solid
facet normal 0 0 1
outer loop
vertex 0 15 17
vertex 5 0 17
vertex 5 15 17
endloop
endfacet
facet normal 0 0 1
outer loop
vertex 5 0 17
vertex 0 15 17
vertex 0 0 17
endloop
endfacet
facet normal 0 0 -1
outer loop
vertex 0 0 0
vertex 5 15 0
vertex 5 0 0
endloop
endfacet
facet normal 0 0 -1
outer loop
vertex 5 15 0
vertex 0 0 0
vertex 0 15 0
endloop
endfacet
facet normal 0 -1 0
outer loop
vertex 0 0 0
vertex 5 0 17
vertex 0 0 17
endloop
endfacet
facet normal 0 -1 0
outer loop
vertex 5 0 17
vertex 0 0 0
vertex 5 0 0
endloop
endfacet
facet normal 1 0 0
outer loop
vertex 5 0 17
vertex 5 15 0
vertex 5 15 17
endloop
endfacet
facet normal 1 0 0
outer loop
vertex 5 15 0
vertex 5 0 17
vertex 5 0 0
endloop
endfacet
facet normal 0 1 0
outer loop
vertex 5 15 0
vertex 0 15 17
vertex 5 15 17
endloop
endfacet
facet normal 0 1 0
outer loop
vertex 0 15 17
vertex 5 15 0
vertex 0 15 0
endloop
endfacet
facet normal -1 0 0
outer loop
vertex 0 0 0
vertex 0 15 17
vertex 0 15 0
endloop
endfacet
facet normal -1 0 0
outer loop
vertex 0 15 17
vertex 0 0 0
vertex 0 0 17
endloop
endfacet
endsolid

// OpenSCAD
// Generated by SolidPython 1.0.1 on 2020-07-29 00:46:54


cube(size = [5, 15, 17]);
/***********************************************
*********      SolidPython code:      **********
************************************************
 
# import packages: SolidPython
from solid import *
from solid.utils import *
from itertools import chain, combinations, permutations


class Resize:

    def __init__(self, scad_file):
        self.scad_file = scad_file
        #self.scad_file = import_scad(scad_file)
        # cone/cylinder param:
        self.r1 = 0
        self.r2 = 0
        self.h = 0
        # rectangular prism param:
        self.w = 0
        self.l = 0
        # ellipse param:
        self.r = 0

    # import OpenScad code (file name corresponds to shape)


    # classify shape + parameters
    def assign(self, param1, param2, param3):
        if self.scad_file == 'cone.scad':
            self.r1 = param1
            self.r2 = param2
            self.h = param3
        elif self.scad_file == 'cylinder.scad':
            self.r1 = param1
            self.r2 = param2
            self.h = param3
        elif self.scad_file == 'rectangularPrism.scad':
            self.h = param1
            self.l = param2
            self.w = param3
        else:
            self.r = param1
            self.h = param2

    # resize parameters
    def iterate(self):
        x = range(3, 20, 2)
        i = 1
        if self.scad_file == 'cone.scad':
            tempList = list(permutations(x, 2))
            for temp in tempList:
                param1 = temp[0]
                param2 = temp[1]
                filepath = 'produced_scad_files/' + 'cone' + str(param1) + '_' + str(param2) + '_' + '.scad'
                scad_render_to_file(cylinder(h=param1, r1=param2, r2=0), filepath)

        elif self.scad_file == 'cylinder.scad':
            tempList = list(permutations(x, 3))
            for temp in tempList:
                param1 = temp[0]
                param2 = temp[1]
                filepath = 'produced_scad_files/' + 'cylinder' + str(param1) + '_' + str(param2) + '_' + '.scad'
                scad_render_to_file(cylinder(h=param1, r1=param2, r2=param2), filepath)

        elif self.scad_file == 'rectangularPrism.scad':
            tempList = list(permutations(x, 3))
            for temp in tempList:
                param1 = temp[0]
                param2 = temp[1]
                param3 = temp[2]
                filepath = 'produced_scad_files/' + 'rectangularPrism' + str(param1) + '_' + str(param2) + '_' + str(
                    param3) + '.scad'
                scad_render_to_file(cube(size=(param1, param2, param3)), filepath)

        elif self.scad_file == 'ellipse.scad':
            tempList = list(permutations(x, 4))
            for temp in tempList:
                param1 = temp[0]
                param2 = temp[1]
                param3 = temp[2]
                param4 = temp[3]
                filepath = 'produced_scad_files/' + 'ellipse' + str(param1) + '_' + str(param2) + '_' + str(param3) + '_' + str(param4) + '.scad'
                scad_render_to_file(scale([param1, param2, param3])(sphere(r=param4)), filepath)

    def render_to_scadfile(self):
        scad_render_to_file(scad, 'example.scad') 
 
************************************************/
